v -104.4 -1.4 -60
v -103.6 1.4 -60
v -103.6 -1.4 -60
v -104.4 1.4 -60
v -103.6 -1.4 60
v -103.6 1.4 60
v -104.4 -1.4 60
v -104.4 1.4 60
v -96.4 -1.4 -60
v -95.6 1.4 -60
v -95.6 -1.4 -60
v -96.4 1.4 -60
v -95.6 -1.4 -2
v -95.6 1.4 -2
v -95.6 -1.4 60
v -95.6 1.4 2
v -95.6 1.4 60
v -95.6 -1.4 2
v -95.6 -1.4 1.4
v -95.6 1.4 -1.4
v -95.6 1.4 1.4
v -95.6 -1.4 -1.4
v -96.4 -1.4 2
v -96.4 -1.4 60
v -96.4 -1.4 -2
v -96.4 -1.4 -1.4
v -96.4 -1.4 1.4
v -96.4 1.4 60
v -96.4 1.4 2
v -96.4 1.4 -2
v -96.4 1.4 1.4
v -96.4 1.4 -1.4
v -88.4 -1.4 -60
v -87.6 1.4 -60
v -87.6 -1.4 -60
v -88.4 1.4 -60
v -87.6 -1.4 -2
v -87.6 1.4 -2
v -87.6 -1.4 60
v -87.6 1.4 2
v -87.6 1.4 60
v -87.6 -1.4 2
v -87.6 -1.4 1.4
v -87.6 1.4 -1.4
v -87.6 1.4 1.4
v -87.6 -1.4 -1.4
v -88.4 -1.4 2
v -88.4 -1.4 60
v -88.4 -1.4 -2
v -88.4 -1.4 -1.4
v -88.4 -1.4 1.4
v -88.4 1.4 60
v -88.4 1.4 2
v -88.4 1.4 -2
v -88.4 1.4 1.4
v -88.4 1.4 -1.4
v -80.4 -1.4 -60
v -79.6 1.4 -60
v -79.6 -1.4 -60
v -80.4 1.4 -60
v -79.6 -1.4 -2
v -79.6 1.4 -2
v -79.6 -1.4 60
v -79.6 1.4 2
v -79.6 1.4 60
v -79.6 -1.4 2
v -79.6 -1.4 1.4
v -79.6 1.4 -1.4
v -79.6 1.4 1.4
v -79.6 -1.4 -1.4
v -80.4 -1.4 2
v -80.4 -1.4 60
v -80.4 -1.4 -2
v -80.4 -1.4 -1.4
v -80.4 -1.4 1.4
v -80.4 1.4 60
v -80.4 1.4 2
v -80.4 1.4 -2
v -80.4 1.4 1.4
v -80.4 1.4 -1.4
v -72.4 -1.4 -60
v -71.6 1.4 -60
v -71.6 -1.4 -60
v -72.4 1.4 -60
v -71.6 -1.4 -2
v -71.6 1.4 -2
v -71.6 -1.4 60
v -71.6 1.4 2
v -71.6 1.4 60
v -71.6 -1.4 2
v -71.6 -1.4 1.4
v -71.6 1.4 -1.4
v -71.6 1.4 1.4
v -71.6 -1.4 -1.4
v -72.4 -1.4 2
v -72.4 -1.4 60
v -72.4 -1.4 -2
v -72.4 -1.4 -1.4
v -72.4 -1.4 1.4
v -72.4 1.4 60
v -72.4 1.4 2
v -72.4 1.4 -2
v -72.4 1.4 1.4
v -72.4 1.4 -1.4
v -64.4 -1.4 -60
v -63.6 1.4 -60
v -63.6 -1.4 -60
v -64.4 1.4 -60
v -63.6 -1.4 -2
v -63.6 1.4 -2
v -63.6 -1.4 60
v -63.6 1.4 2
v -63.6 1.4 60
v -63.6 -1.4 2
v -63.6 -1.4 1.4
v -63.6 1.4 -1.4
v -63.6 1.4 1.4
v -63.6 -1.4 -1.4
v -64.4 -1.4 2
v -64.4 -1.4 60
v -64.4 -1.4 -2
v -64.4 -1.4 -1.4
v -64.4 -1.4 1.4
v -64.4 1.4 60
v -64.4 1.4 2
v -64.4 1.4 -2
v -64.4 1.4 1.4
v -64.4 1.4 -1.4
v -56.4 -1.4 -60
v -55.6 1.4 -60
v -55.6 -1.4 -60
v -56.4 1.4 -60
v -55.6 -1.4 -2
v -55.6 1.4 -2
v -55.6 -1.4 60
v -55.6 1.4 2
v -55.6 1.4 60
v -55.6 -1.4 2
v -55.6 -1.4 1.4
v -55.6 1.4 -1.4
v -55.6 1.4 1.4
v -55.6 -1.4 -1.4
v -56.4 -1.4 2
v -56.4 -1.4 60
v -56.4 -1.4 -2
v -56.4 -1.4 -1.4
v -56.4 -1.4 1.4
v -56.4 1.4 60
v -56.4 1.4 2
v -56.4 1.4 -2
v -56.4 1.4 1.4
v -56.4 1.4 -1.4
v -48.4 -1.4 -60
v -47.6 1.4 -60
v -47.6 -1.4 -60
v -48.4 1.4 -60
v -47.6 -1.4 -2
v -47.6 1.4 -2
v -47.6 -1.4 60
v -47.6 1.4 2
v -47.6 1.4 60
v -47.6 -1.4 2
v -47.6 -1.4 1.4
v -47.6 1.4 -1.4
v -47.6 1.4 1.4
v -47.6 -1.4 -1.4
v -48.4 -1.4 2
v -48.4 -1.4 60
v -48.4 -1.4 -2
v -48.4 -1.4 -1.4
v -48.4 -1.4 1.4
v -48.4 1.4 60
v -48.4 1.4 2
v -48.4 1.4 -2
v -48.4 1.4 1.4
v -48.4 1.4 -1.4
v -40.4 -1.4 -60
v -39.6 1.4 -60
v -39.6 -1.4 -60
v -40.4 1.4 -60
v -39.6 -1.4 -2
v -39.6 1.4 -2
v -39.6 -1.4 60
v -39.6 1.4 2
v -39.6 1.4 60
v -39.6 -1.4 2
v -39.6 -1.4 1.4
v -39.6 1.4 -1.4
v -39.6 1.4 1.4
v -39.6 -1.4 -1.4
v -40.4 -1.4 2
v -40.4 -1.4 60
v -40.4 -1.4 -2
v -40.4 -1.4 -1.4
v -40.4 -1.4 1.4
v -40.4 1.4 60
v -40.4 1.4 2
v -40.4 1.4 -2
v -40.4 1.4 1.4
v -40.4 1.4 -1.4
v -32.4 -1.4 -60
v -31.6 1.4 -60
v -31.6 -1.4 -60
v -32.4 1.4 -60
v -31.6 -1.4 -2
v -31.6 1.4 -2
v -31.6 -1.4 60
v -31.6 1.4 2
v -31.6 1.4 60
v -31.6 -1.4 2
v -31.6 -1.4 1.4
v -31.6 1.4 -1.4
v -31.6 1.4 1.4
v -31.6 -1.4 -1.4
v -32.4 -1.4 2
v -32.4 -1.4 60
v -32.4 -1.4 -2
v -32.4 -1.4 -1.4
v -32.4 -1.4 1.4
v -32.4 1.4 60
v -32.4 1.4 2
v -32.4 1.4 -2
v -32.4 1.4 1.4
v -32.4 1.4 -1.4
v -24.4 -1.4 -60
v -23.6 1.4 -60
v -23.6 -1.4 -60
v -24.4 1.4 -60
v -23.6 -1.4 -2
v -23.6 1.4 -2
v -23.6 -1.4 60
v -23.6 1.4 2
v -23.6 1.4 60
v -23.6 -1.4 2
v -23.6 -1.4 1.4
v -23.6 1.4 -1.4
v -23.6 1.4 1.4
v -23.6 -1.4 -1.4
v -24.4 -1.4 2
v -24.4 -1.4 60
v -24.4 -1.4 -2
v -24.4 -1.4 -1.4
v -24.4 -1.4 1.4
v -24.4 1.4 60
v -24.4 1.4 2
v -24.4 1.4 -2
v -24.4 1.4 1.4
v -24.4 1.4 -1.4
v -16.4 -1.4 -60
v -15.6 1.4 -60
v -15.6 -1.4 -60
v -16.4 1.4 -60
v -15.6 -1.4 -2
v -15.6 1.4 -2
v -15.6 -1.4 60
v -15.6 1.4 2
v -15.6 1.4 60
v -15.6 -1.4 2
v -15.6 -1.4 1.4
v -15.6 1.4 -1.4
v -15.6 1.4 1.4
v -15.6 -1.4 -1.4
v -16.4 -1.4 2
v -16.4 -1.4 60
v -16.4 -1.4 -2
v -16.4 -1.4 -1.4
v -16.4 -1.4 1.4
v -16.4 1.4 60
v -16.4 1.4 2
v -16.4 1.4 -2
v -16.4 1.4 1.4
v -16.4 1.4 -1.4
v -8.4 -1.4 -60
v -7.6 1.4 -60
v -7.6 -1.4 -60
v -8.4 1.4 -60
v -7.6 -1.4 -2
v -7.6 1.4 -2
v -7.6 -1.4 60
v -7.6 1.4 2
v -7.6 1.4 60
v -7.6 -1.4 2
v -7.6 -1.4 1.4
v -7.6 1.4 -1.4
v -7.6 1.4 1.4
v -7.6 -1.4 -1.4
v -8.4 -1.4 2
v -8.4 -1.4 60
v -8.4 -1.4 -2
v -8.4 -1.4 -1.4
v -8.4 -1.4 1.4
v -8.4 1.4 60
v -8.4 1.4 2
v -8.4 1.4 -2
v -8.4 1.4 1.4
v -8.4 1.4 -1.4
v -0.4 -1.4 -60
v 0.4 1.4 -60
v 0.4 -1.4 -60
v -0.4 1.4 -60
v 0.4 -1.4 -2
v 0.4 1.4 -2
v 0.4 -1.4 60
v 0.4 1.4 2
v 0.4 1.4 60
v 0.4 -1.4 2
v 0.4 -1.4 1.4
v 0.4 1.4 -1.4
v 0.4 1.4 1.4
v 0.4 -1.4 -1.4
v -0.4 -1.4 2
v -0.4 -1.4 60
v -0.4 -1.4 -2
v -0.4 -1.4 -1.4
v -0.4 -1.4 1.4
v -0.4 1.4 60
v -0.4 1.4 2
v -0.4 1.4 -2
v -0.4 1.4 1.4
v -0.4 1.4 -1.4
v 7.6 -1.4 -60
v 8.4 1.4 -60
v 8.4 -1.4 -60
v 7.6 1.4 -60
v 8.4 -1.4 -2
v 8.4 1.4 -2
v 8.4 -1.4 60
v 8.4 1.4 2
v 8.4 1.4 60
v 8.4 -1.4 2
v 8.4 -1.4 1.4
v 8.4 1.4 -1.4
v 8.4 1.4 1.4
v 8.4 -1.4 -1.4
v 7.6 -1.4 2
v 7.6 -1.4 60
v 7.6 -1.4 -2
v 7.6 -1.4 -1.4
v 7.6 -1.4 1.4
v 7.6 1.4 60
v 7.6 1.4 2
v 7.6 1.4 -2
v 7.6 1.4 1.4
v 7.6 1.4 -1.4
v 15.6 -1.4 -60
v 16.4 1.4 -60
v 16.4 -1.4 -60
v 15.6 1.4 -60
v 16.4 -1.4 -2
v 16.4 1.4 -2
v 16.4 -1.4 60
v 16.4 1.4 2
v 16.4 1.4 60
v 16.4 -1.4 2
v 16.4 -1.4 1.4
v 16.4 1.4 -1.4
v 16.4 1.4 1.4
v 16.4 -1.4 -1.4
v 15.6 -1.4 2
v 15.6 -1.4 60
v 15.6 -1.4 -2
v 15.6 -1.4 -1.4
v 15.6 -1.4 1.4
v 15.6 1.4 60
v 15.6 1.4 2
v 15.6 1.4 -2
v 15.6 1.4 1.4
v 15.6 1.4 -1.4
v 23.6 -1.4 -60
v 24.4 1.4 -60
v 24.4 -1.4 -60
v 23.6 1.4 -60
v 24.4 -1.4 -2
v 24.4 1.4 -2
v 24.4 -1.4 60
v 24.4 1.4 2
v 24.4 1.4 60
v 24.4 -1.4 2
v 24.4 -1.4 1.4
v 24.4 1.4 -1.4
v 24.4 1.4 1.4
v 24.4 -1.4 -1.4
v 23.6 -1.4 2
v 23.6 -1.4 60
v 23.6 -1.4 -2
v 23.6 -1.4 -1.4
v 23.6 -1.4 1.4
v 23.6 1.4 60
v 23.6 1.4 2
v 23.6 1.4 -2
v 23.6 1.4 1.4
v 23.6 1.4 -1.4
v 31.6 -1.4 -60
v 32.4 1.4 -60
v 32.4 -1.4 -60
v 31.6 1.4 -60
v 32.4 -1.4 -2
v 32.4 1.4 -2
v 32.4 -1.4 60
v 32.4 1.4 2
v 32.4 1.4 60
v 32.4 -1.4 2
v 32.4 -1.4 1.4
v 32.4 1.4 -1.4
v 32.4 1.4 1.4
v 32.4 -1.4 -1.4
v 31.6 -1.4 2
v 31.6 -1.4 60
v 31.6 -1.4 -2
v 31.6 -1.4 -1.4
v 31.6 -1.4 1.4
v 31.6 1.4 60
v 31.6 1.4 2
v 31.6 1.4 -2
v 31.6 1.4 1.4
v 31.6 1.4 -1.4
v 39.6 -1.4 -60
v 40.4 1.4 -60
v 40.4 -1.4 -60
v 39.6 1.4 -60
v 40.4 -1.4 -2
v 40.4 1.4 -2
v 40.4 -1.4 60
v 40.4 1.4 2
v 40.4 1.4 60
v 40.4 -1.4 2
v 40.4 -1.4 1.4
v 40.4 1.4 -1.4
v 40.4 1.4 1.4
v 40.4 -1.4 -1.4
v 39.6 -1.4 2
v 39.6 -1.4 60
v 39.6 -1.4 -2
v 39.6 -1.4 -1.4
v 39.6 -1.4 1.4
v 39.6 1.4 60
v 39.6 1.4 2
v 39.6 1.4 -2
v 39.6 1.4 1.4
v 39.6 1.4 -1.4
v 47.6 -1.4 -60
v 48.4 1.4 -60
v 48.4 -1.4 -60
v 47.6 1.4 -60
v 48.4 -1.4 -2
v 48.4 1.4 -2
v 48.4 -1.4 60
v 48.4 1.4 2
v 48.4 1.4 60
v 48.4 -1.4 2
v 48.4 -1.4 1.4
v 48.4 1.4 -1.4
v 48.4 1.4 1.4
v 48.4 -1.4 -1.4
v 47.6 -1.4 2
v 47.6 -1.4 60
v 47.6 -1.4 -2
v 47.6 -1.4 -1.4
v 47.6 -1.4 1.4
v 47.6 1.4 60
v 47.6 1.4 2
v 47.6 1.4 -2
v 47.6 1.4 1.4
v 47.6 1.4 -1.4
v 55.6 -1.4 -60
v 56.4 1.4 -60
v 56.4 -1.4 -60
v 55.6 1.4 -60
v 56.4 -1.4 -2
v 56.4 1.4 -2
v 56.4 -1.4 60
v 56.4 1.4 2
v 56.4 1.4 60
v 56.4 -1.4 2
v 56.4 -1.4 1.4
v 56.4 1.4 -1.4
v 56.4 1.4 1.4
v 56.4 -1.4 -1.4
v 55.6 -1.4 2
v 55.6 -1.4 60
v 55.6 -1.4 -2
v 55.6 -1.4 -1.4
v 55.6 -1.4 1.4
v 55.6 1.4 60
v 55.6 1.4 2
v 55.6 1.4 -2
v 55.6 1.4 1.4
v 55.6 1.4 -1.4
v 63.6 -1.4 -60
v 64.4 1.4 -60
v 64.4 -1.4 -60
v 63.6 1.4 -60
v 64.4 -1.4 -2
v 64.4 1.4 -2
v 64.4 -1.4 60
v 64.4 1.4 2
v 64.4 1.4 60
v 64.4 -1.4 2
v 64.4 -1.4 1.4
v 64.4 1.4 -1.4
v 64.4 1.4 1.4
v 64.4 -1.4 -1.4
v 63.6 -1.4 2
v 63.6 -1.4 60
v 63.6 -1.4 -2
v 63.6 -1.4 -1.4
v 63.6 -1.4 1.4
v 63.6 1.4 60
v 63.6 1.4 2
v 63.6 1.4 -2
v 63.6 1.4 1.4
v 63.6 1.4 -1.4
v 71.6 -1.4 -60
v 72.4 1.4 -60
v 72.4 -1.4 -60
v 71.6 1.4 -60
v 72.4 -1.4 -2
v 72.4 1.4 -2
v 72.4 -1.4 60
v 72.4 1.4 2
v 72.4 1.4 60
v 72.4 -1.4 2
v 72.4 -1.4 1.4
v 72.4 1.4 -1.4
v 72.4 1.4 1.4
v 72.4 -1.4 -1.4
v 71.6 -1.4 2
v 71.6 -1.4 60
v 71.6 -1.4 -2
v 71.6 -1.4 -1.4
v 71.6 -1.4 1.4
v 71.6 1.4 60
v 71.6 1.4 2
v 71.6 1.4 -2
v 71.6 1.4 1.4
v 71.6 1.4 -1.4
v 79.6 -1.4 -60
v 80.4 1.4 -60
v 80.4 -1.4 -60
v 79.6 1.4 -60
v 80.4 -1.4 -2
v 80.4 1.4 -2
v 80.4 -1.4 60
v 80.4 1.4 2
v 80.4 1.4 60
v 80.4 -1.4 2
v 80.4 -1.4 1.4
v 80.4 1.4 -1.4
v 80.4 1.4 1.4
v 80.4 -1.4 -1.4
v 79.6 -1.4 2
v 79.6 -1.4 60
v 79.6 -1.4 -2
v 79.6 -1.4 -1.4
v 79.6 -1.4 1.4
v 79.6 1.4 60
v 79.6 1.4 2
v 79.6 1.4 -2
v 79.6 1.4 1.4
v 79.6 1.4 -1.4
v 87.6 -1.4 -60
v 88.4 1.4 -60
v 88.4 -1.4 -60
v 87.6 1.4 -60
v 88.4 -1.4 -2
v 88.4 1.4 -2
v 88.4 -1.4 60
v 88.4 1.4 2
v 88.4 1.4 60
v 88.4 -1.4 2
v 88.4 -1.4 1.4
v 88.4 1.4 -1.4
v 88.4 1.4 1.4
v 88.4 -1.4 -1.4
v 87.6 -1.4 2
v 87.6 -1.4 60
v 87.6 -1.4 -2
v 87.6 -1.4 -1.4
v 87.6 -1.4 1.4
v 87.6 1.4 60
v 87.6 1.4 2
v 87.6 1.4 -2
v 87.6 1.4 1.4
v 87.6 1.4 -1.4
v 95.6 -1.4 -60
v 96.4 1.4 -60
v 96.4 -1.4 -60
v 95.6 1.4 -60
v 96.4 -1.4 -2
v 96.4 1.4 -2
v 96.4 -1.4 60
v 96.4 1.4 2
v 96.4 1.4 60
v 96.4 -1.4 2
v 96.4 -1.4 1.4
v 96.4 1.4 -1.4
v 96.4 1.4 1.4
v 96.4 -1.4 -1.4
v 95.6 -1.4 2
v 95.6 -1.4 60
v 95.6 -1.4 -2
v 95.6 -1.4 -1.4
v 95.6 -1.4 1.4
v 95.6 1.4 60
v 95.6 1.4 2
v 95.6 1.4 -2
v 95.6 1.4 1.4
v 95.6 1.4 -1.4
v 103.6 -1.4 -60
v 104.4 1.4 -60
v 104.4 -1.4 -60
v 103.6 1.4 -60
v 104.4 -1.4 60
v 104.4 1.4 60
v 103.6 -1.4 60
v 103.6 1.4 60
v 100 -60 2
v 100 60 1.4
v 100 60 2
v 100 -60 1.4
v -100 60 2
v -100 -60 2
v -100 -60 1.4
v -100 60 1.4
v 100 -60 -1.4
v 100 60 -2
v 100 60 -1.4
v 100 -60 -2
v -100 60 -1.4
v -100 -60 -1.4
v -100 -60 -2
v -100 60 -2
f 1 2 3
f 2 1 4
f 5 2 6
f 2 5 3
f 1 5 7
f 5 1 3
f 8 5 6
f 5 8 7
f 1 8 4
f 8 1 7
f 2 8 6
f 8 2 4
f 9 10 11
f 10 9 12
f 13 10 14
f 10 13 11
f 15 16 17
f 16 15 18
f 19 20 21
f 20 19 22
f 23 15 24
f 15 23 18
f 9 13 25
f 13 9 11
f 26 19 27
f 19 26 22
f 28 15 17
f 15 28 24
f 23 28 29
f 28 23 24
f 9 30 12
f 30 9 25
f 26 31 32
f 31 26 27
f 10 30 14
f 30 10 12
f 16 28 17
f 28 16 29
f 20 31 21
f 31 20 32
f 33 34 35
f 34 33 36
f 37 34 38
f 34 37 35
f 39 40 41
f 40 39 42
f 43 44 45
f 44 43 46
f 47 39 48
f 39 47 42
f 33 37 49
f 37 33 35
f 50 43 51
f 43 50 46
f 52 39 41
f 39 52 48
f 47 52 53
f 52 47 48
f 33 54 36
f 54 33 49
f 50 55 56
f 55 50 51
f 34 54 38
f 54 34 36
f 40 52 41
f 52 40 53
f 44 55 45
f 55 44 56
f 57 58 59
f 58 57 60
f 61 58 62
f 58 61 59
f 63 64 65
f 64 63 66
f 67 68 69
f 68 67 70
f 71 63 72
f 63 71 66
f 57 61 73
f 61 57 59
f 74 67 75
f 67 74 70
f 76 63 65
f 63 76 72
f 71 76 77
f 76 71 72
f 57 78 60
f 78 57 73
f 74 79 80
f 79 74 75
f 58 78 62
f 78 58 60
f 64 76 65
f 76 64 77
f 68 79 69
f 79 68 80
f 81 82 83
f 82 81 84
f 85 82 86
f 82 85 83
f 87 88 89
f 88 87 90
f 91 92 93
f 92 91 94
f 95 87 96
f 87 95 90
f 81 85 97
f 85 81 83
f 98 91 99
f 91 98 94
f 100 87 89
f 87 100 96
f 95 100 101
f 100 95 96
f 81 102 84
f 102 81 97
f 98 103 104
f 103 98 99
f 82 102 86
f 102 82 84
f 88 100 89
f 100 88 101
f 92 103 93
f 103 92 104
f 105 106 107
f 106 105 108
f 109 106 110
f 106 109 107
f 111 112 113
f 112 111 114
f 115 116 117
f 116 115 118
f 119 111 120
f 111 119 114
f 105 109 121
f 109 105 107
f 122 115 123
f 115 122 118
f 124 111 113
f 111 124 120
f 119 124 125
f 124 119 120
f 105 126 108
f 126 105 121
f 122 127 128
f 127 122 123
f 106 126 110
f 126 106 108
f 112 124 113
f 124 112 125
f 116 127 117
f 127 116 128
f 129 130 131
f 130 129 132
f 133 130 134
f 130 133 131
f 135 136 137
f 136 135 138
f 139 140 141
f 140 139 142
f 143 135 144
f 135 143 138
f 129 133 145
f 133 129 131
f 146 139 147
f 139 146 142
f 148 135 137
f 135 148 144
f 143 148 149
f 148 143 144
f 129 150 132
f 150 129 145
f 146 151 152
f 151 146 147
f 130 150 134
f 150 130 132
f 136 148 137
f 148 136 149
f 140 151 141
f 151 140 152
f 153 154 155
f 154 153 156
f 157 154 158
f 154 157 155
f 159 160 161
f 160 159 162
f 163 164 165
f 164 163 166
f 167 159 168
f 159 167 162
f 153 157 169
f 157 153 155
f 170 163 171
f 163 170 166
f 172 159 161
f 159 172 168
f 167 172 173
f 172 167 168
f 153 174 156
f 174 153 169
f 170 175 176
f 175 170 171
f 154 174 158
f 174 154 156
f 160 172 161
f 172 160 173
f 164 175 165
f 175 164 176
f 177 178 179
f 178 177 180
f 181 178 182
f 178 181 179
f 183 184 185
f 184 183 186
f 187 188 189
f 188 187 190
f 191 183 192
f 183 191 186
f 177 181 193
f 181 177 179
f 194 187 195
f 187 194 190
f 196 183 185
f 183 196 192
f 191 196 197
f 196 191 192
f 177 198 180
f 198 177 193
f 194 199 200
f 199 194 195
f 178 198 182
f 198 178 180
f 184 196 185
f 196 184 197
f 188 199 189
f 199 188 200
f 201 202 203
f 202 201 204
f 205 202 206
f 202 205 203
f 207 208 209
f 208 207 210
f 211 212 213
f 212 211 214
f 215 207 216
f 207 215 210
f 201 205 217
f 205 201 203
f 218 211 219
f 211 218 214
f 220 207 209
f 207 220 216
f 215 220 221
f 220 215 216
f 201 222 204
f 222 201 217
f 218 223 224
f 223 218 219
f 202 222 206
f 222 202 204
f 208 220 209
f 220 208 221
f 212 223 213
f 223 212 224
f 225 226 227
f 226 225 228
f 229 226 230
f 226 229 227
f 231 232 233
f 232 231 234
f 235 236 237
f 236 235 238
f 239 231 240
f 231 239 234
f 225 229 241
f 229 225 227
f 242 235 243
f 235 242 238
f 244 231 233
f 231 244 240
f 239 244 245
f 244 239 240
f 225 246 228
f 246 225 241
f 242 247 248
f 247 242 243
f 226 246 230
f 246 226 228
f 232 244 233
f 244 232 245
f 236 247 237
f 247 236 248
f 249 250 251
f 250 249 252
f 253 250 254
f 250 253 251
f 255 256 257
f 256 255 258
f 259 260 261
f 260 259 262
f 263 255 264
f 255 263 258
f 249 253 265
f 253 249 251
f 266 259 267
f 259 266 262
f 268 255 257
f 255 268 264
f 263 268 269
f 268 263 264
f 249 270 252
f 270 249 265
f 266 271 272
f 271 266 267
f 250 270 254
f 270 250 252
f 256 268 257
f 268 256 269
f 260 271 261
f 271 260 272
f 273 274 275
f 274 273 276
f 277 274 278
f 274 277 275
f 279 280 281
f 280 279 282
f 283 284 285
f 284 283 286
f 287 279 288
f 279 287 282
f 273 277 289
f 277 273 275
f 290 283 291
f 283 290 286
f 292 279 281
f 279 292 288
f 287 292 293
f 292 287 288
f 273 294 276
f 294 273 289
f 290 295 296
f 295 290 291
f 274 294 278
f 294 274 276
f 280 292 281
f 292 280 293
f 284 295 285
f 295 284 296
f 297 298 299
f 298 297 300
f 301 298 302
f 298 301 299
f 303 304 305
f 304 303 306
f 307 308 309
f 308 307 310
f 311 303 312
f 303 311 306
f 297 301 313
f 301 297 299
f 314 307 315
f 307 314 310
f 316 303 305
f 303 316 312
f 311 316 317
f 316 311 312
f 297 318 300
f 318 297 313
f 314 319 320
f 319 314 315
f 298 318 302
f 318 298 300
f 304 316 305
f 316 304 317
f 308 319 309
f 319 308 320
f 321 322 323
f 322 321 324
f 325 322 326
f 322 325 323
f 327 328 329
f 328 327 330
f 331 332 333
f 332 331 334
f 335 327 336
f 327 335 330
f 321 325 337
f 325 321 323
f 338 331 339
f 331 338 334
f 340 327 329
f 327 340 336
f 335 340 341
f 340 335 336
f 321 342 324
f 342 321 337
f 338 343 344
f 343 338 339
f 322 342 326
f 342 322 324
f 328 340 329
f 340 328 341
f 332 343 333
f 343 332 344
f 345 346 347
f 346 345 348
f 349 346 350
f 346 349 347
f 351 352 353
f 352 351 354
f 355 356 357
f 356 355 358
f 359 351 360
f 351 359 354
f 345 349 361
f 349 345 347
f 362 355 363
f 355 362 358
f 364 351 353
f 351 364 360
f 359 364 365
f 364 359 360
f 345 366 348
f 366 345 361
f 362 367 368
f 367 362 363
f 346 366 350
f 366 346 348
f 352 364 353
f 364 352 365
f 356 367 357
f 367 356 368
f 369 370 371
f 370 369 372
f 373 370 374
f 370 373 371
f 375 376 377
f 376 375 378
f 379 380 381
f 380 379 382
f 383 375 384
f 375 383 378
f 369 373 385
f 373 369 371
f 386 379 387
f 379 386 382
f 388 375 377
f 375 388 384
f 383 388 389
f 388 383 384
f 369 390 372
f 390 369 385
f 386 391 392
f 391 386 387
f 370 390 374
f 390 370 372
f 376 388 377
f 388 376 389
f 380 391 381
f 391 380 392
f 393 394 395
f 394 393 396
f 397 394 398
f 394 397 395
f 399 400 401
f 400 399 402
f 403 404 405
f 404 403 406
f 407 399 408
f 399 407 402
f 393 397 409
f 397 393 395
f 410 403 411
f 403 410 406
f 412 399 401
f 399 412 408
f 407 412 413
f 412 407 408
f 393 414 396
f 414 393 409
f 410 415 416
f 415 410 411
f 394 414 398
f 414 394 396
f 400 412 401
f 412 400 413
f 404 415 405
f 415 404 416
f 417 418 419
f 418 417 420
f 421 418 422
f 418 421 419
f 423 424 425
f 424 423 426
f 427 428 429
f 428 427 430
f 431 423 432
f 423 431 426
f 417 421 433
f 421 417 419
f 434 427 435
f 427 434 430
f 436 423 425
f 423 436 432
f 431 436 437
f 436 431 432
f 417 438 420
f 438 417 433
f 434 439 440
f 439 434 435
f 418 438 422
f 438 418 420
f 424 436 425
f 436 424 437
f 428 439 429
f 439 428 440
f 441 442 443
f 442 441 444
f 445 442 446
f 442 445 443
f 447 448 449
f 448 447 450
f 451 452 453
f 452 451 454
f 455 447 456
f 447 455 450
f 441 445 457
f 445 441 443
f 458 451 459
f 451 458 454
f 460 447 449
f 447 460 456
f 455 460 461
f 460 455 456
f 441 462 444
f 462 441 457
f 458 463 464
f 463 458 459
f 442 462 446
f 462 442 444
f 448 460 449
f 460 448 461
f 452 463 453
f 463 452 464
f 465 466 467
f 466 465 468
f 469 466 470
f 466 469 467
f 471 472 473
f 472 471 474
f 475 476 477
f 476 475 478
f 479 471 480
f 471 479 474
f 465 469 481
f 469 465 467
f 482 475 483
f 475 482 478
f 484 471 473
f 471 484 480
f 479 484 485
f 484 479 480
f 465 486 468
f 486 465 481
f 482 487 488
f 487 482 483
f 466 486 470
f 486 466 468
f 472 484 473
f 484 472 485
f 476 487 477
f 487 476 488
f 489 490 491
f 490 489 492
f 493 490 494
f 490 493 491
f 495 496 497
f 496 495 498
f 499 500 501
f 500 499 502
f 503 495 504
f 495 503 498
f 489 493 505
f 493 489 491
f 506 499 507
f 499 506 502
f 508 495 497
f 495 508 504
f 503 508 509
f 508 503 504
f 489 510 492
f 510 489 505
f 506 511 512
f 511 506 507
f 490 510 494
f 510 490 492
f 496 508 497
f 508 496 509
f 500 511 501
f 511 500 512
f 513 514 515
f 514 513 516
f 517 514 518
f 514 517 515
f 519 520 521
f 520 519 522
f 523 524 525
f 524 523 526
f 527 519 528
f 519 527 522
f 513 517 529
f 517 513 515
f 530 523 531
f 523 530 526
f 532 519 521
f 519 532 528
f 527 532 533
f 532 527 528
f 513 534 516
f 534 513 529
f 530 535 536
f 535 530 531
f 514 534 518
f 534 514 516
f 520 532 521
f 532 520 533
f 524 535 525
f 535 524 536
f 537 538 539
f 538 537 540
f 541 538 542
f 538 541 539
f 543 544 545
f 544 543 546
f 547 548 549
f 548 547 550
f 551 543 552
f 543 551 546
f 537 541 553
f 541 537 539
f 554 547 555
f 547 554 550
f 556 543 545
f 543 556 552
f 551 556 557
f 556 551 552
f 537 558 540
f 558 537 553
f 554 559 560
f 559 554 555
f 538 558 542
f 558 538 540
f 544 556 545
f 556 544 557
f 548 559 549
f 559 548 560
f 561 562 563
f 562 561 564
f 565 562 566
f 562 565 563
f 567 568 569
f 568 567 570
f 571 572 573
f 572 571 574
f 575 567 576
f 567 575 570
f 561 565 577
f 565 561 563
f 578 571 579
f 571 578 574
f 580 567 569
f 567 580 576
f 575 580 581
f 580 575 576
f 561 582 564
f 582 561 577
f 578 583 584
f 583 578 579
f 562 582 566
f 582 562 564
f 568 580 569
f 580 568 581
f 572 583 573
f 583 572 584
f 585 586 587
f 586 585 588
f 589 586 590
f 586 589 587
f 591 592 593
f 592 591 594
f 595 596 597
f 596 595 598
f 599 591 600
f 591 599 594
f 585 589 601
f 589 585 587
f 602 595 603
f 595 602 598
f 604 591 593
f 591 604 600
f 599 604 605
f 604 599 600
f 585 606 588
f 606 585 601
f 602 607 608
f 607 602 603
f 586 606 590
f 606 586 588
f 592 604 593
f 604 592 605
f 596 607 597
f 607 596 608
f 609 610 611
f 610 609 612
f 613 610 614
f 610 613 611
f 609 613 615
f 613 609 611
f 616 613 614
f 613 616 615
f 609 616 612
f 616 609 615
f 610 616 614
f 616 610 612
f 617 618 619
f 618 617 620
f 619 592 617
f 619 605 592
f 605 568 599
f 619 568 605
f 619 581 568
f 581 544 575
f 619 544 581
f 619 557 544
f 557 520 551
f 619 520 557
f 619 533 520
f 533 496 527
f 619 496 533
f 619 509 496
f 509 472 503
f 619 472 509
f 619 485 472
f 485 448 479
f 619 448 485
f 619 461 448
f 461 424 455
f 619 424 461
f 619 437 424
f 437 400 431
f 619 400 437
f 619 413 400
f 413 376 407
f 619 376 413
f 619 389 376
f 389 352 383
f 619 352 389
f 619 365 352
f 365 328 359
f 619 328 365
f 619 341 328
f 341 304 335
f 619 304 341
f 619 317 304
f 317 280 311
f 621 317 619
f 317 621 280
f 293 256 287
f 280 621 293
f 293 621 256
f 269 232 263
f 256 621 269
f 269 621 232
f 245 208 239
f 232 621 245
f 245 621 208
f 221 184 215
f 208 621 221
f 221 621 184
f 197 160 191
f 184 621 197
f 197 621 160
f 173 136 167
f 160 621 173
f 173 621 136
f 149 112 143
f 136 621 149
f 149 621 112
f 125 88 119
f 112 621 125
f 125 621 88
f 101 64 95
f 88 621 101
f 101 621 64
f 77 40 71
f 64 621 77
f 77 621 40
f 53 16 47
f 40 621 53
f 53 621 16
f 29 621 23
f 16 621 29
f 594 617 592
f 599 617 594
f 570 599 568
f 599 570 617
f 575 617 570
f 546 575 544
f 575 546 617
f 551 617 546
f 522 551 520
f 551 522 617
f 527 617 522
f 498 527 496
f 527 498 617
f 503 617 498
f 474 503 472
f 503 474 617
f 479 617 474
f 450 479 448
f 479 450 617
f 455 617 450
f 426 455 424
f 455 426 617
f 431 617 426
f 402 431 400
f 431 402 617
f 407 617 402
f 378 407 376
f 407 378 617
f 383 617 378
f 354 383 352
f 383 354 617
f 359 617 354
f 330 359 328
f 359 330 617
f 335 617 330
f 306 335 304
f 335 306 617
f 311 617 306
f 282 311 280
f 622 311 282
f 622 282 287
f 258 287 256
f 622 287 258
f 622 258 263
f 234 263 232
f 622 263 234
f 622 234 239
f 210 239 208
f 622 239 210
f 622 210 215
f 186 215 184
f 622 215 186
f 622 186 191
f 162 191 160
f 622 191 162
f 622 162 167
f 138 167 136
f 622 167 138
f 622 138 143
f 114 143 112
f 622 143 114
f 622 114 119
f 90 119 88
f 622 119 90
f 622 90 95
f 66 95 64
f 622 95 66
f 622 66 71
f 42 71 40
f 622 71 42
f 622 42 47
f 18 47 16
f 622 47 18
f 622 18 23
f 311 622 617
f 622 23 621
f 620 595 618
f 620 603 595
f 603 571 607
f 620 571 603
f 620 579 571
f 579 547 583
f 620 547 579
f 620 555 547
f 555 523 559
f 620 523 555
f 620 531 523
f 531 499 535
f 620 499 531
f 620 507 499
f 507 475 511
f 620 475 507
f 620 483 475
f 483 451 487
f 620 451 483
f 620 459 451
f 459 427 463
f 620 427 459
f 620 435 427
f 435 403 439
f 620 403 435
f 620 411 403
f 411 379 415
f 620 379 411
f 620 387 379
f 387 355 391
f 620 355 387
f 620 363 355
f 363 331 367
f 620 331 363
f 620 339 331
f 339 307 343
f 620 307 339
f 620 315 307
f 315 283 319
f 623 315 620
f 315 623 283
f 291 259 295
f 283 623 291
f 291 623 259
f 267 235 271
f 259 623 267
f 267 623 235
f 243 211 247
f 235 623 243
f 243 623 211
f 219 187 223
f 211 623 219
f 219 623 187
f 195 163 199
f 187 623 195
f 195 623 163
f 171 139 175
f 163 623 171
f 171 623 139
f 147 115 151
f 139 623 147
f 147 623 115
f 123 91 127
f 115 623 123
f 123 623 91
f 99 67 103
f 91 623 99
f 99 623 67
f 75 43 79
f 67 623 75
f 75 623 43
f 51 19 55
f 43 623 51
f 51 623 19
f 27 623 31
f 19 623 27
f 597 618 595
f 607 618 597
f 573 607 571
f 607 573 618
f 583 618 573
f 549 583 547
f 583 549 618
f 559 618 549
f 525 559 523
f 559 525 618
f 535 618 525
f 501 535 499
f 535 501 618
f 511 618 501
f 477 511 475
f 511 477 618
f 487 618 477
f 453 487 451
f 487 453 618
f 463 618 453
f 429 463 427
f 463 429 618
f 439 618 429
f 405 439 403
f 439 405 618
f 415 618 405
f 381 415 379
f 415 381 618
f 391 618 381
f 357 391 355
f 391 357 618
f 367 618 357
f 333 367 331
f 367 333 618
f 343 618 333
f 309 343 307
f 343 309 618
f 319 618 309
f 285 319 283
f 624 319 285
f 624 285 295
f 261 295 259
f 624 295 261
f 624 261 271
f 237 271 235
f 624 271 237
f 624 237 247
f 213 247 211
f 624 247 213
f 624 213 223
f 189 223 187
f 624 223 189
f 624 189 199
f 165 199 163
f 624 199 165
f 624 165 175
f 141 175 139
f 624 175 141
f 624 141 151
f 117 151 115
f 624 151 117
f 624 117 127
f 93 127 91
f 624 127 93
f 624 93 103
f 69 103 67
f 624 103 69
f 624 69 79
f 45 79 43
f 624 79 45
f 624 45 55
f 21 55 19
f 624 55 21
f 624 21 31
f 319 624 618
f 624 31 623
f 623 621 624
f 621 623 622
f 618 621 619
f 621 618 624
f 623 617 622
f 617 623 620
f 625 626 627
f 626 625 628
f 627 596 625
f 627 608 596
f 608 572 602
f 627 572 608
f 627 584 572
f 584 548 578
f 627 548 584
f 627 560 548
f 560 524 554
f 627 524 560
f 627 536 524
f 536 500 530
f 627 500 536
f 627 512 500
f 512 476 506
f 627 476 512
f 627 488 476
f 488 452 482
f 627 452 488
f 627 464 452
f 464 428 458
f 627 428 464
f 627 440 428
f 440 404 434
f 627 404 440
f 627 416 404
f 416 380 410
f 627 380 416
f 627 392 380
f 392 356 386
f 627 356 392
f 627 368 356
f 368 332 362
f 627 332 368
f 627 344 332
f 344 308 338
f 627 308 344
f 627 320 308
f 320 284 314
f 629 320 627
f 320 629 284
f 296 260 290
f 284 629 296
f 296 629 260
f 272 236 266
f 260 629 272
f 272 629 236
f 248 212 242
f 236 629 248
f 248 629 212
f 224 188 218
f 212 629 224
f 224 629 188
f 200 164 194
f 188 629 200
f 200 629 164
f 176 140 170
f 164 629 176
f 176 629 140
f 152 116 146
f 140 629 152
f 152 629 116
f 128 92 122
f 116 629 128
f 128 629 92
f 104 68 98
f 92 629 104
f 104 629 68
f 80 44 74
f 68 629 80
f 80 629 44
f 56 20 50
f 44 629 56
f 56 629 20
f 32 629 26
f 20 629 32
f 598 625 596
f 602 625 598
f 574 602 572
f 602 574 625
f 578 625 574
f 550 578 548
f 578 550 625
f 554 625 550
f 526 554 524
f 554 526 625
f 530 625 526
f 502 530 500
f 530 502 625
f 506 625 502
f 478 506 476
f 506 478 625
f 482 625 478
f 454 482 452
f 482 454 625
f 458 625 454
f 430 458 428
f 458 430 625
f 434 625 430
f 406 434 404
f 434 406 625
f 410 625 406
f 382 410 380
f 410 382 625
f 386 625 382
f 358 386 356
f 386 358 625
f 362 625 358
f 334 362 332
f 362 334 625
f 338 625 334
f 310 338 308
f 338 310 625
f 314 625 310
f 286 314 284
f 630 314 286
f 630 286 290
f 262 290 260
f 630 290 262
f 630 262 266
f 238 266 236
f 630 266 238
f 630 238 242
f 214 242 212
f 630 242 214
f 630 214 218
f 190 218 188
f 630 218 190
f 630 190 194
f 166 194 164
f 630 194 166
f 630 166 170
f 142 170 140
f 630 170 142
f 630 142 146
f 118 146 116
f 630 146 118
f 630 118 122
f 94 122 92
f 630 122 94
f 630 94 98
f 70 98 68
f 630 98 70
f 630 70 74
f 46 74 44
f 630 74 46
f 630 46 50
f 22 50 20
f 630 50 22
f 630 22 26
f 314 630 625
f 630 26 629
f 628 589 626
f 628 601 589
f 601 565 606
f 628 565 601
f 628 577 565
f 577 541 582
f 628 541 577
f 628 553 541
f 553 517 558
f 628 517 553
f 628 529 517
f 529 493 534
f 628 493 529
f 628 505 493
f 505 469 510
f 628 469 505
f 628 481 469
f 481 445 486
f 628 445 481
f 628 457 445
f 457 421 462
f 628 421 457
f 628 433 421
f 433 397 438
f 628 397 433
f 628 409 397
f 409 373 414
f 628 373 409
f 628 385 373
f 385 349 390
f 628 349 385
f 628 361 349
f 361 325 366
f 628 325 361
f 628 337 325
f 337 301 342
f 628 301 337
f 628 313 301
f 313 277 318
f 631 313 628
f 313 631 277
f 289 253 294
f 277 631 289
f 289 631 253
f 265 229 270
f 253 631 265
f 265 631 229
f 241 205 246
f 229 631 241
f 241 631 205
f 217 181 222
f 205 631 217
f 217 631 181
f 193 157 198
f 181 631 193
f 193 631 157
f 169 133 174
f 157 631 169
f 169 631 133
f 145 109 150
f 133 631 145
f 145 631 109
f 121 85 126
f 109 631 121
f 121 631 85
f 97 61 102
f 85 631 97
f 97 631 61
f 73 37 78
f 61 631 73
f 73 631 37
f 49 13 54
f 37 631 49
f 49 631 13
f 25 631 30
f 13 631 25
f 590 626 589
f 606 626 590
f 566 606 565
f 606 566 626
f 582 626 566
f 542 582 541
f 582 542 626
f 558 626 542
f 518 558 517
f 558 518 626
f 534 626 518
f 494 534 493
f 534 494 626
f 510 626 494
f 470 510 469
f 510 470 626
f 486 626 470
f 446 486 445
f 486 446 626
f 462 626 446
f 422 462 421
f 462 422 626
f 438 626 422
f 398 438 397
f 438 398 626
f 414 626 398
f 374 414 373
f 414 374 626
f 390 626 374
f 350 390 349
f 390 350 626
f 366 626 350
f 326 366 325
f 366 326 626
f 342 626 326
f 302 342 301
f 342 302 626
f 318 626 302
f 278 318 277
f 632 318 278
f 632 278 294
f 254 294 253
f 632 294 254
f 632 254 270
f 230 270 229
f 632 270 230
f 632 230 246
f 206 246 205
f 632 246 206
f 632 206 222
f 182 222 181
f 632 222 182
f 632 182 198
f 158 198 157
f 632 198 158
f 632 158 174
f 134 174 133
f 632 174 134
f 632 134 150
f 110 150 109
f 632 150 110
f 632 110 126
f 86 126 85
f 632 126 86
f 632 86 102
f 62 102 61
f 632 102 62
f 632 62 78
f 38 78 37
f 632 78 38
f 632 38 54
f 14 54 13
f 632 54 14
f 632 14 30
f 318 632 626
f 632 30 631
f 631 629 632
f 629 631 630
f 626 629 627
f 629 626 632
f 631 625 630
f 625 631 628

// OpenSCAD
$fn=64;

sheet_len = 200;
sheet_wid = 120;
sheet_thk = 4.0;

liner_thk = 0.6;
flute_amp = (sheet_thk - 2*liner_thk)/2;
flute_pitch = 8;
flute_wall = 0.8;

module liner(zpos){
    translate([0,0,zpos])
        cube([sheet_len, sheet_wid, liner_thk], center=true);
}

module flute_rib(xpos){
    translate([xpos,0,0])
    linear_extrude(height=sheet_wid, center=true, convexity=10)
        polygon(points=[
            [-flute_wall/2, -sheet_thk/2 + liner_thk],
            [-flute_wall/2, 0],
            [-flute_wall/2,  sheet_thk/2 - liner_thk],
            [ flute_wall/2,  sheet_thk/2 - liner_thk],
            [ flute_wall/2, 0],
            [ flute_wall/2, -sheet_thk/2 + liner_thk]
        ]);
}

module flutes(){
    n = floor(sheet_len/flute_pitch) + 2;
    for(i=[-n:n]){
        x = i*flute_pitch;
        if (abs(x) <= sheet_len/2 + flute_pitch)
            flute_rib(x);
    }
}

module corrugated_sheet(){
    union(){
        liner(sheet_thk/2 - liner_thk/2);
        liner(-sheet_thk/2 + liner_thk/2);
        flutes();
    }
}

corrugated_sheet();
